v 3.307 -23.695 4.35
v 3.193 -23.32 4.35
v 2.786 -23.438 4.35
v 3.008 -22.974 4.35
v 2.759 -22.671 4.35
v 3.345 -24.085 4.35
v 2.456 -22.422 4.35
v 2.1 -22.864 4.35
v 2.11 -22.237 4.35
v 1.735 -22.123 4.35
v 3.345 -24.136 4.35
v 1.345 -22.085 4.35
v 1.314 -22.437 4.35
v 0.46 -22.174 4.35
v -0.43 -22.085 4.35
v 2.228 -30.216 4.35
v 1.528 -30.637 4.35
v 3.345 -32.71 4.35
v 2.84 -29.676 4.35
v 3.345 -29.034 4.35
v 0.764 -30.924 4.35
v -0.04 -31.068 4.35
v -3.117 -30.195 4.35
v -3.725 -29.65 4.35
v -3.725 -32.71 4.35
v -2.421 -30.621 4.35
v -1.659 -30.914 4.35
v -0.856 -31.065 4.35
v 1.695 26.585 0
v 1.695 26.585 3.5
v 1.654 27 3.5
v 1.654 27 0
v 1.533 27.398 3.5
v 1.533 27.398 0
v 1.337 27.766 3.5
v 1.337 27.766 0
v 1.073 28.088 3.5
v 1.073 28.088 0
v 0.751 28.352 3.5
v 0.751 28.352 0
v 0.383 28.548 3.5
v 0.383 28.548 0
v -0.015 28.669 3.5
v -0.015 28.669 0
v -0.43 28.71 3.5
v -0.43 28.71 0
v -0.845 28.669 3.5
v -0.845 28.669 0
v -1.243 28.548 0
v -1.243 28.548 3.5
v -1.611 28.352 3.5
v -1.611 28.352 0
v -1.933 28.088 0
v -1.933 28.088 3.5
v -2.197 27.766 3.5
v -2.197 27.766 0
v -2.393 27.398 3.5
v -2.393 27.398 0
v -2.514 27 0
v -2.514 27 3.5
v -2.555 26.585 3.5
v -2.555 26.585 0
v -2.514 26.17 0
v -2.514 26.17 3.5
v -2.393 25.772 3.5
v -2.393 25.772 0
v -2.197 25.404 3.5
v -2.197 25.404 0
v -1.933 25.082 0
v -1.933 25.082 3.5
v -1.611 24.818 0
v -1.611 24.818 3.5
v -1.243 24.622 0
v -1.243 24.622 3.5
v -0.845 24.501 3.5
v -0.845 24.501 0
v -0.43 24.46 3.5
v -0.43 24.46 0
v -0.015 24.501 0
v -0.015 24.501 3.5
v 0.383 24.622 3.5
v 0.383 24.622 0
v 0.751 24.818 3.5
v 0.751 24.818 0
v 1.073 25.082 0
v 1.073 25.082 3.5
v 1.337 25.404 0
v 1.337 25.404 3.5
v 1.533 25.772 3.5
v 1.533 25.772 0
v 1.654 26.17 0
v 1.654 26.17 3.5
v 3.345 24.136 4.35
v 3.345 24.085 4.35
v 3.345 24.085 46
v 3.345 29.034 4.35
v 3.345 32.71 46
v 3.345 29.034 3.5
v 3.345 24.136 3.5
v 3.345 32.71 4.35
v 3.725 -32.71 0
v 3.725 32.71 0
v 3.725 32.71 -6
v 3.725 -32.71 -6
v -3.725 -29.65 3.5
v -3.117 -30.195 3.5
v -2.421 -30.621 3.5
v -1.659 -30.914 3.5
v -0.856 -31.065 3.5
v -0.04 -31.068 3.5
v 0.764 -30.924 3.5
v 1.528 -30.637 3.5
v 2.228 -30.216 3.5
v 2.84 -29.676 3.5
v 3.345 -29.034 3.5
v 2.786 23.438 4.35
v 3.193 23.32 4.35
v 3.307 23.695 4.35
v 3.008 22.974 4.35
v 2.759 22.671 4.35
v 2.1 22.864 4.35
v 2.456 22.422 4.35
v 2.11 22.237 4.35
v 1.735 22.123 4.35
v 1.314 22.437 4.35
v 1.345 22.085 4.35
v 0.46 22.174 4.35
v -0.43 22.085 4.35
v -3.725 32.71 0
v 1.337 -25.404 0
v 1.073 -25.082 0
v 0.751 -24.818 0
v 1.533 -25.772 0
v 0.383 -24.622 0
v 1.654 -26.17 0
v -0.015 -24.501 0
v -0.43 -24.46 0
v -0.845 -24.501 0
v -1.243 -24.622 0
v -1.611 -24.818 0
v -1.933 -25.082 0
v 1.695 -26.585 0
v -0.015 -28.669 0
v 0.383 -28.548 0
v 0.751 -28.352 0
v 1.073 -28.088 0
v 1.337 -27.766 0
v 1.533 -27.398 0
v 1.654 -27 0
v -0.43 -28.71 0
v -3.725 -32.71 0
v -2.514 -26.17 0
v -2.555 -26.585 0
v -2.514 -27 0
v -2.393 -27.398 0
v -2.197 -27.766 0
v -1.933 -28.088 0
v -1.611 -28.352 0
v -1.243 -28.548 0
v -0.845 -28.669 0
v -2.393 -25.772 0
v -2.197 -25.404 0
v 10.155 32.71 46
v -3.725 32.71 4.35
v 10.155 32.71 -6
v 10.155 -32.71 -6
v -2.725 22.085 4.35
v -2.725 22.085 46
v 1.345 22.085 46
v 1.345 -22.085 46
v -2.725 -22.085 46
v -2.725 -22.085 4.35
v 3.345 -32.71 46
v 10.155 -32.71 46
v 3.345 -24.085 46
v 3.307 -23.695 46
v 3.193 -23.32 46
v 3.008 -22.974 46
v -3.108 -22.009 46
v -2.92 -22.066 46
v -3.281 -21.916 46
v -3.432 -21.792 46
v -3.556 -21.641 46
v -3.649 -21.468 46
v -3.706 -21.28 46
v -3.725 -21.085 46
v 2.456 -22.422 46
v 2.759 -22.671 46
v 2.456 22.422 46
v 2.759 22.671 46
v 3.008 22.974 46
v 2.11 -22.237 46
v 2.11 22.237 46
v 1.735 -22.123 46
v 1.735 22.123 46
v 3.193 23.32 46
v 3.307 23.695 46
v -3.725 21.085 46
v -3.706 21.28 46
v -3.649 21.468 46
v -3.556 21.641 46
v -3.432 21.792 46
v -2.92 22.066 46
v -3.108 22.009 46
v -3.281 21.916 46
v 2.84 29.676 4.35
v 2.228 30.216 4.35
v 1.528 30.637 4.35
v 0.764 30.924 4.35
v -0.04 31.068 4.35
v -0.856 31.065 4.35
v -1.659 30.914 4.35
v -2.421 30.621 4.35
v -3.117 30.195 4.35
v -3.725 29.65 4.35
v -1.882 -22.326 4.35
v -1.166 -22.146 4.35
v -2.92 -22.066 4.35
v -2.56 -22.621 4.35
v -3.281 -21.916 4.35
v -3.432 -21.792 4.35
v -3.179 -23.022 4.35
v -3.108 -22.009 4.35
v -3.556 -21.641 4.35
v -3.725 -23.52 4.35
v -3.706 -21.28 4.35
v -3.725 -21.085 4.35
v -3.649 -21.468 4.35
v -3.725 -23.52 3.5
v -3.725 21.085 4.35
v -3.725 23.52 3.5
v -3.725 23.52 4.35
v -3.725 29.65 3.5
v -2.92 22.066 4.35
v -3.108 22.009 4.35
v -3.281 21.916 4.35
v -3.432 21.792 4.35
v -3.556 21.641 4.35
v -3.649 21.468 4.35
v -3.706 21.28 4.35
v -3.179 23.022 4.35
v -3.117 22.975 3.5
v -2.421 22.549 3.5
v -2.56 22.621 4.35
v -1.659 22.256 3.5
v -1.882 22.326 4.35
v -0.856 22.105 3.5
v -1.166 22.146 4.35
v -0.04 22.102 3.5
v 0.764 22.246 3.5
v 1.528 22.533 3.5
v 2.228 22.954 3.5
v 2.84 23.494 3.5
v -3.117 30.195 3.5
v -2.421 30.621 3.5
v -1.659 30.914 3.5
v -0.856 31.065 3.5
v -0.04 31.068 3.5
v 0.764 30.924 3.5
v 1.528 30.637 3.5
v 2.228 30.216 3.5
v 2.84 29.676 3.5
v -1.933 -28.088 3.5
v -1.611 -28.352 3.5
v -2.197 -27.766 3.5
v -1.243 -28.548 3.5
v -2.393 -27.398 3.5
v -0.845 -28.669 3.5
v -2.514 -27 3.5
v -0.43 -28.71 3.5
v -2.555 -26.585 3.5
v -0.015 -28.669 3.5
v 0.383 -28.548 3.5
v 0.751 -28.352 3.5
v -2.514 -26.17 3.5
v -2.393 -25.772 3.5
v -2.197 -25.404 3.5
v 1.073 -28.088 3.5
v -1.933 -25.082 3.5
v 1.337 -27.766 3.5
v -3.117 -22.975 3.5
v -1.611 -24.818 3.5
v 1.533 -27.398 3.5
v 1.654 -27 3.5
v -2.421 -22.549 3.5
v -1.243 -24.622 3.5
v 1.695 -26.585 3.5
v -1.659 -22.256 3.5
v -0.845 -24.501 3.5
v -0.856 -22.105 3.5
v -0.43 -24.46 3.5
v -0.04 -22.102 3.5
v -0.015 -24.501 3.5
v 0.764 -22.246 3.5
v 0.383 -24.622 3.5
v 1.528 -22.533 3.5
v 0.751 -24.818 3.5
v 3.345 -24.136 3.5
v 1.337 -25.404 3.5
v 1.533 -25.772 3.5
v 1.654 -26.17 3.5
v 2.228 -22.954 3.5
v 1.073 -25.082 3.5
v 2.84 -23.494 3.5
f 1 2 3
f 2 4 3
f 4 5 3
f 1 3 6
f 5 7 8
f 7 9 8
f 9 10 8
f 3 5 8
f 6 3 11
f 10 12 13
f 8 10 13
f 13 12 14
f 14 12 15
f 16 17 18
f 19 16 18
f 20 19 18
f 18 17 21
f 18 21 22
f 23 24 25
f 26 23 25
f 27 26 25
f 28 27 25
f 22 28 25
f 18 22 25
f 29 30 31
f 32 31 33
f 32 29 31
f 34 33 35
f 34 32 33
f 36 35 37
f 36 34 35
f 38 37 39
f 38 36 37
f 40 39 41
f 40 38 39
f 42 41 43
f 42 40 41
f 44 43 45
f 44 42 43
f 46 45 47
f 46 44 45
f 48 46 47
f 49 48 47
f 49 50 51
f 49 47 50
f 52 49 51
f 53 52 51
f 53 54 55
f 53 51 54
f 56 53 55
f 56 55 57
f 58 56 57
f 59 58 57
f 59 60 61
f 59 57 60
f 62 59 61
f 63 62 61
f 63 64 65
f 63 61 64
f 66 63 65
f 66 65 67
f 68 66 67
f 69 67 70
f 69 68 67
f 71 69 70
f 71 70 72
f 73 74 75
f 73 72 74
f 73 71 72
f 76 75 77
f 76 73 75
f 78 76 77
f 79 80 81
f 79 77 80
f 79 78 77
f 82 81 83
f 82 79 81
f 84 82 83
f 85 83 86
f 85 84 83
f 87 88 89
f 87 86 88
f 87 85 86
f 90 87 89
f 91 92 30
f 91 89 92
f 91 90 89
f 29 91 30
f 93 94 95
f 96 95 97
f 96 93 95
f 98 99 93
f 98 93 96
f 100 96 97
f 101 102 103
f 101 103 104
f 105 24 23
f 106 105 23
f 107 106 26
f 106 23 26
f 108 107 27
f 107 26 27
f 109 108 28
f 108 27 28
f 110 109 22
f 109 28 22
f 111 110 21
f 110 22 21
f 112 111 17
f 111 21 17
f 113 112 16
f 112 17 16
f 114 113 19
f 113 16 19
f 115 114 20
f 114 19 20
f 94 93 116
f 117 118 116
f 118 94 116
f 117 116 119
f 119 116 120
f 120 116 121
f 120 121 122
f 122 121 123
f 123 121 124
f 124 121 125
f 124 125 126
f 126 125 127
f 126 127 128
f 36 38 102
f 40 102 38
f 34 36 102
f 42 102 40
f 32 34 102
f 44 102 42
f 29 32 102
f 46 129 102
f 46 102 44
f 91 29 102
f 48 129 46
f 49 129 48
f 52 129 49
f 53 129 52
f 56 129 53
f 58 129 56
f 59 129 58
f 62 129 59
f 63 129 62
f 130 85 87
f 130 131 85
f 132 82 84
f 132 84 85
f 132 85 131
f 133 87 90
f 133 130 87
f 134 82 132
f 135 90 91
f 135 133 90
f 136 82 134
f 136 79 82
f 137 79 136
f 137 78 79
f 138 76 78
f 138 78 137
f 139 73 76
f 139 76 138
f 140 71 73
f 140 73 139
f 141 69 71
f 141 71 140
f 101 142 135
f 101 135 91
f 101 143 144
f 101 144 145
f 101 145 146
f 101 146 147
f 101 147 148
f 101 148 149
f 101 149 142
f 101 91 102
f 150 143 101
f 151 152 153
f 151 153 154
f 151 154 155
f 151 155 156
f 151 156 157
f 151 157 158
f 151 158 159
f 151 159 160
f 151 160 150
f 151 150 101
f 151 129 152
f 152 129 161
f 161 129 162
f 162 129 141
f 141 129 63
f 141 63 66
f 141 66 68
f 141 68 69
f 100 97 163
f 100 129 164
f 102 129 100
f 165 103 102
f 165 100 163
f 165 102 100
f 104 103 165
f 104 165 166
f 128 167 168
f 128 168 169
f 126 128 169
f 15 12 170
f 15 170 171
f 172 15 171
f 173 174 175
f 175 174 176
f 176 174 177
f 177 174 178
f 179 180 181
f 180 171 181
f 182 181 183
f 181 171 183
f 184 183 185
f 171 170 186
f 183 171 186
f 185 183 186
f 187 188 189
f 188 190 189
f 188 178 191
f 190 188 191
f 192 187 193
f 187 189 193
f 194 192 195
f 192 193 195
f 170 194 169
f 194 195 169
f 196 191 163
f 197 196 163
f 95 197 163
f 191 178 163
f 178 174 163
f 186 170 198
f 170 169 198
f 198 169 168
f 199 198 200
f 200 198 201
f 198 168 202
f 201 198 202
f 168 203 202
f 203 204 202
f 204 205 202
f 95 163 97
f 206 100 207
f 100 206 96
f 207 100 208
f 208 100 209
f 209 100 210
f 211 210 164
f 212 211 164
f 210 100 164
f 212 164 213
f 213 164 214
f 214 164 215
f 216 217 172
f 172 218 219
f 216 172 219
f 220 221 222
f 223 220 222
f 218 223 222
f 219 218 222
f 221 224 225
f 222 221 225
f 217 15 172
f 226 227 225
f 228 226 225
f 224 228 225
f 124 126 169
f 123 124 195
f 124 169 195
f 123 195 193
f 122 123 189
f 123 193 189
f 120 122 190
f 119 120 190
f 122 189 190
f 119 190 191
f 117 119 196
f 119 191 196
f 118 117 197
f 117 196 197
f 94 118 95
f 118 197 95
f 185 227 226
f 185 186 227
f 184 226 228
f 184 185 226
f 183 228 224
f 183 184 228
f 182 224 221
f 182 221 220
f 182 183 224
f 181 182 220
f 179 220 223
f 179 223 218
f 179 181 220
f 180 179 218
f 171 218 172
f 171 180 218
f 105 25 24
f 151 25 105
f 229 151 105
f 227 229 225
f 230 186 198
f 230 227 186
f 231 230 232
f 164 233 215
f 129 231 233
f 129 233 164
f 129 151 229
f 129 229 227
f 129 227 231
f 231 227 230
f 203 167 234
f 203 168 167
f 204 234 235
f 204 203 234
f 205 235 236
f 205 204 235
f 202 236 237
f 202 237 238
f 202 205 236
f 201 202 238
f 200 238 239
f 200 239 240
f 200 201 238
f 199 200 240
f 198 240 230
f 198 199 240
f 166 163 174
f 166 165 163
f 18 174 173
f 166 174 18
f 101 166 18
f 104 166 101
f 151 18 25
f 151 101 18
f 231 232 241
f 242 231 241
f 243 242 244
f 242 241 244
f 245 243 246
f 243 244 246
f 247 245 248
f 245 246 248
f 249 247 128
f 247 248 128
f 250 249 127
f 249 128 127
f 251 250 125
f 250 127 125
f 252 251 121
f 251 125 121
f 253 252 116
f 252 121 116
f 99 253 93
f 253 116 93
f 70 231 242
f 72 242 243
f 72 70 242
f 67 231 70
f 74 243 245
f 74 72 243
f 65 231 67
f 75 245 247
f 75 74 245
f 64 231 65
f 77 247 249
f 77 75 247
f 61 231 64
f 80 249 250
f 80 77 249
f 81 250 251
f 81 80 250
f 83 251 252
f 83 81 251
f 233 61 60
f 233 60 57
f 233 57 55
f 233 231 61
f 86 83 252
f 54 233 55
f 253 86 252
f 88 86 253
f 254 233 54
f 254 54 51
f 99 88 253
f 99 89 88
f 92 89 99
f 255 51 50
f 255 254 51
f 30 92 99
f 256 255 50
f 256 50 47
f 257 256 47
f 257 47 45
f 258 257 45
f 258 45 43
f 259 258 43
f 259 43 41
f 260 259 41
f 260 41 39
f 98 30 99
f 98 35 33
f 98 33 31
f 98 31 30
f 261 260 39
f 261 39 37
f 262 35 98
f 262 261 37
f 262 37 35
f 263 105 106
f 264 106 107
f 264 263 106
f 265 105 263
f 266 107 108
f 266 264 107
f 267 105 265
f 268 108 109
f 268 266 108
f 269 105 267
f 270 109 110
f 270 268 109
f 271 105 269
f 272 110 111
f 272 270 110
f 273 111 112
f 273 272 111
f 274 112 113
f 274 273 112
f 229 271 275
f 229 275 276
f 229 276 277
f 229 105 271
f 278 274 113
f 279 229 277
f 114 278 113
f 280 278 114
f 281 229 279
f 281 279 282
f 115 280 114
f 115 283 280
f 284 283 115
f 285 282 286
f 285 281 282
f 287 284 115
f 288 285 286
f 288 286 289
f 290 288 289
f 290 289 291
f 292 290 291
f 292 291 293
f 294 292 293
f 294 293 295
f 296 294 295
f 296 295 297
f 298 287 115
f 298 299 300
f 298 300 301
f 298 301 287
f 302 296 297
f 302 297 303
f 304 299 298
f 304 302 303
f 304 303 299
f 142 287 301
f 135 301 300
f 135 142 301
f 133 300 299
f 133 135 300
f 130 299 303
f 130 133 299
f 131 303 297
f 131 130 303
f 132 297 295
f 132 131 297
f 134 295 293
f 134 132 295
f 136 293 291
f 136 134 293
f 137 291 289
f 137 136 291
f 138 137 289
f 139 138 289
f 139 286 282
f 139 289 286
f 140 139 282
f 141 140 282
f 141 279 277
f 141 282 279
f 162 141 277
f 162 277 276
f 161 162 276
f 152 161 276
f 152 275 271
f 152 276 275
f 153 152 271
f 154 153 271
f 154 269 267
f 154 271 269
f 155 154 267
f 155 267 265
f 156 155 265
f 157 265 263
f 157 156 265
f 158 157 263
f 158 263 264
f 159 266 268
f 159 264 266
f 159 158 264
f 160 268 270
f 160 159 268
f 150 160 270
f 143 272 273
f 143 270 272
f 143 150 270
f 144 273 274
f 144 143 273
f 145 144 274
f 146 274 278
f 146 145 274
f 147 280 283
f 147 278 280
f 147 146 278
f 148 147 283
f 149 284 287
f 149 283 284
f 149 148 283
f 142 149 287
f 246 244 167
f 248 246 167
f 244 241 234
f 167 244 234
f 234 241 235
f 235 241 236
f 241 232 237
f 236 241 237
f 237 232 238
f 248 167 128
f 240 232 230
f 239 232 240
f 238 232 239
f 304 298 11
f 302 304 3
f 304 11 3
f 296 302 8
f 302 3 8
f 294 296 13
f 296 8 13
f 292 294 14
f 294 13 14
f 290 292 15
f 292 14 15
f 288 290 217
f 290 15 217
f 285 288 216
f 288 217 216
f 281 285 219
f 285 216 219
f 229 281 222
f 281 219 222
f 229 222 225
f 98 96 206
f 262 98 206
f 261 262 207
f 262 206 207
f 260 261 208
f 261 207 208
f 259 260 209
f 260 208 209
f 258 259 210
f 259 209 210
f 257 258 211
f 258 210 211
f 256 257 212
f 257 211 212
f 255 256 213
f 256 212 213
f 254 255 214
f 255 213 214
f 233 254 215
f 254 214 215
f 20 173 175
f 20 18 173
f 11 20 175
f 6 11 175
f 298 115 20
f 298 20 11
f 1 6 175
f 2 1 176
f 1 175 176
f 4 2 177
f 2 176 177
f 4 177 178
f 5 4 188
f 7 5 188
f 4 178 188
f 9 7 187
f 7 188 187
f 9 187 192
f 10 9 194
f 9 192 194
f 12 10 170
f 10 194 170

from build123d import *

# Parameters (mm, degrees)
SKETCH_W        = 7.45
SKETCH_H        = 65.42
SKETCH_R        = 2.125
PAD_DEPTH       = 4.35
POCKET_DEPTH    = 0.85
POCKET_FACE1_W  = 65.42
POCKET_FACE1_H  = 4.35
PAD001_DEPTH    = 6.43
PAD001_FACE13_W = 65.42
PAD001_FACE13_H = 6.43
PAD002_DEPTH    = 6
PAD003_DEPTH    = 41.65
FILLET_R        = 2
FILLET001_R     = 1


with BuildPart() as part:
    # Sketch → Pad (new body)
    with BuildSketch(Plane.XY):
        Rectangle(SKETCH_W, SKETCH_H)
        with Locations((-0.43, -26.585)):
            Circle(SKETCH_R, mode=Mode.SUBTRACT)
        with Locations((-0.43, 26.585)):
            Circle(SKETCH_R, mode=Mode.SUBTRACT)
    extrude(amount=PAD_DEPTH)

    # Sketch001 (on DatumPlane) → Pocket (cut)
    with BuildSketch(Plane.XY.offset(4.35)):
        with BuildLine():
            ThreePointArc((3.345, -24.135638), (-0.039757, -22.101953), (-3.725, -23.520204))
            Line((-3.725, -23.520204), (-3.725, -29.649796))
            ThreePointArc((-3.725, -29.649796), (-0.039757, -31.068047), (3.345, -29.034362))
            Line((3.345, -24.135638), (3.345, -29.034362))
        make_face()
        with BuildLine():
            ThreePointArc((-3.725, 23.520204), (-0.039757, 22.101953), (3.345, 24.135638))
            Line((3.345, 29.034362), (3.345, 24.135638))
            ThreePointArc((3.345, 29.034362), (-0.039757, 31.068047), (-3.725, 29.649796))
            Line((-3.725, 29.649796), (-3.725, 23.520204))
        make_face()
    extrude(amount=-POCKET_DEPTH, mode=Mode.SUBTRACT)

    # Pocket Face1 → Pad001 (add)
    with BuildSketch(Plane(origin=(3.725, 0, 2.175), x_dir=(0, -1, 0), z_dir=(1, 0, 0))):
        Rectangle(POCKET_FACE1_W, POCKET_FACE1_H)
    extrude(amount=PAD001_DEPTH)

    # Pad001 Face13 → Pad002 (add)
    with BuildSketch(Plane(origin=(6.94, 0, 0), x_dir=(0, -1, 0), z_dir=(0, 0, -1))):
        Rectangle(PAD001_FACE13_W, PAD001_FACE13_H)
    extrude(amount=PAD002_DEPTH)

    # Sketch002 (on Face5 of Pad002) → Pad003 (join)
    with BuildSketch(Plane.XY.offset(4.35)):
        Polygon((10.155, 32.71), (10.155, -32.71), (3.345, -32.71), (3.345, -22.085), (-3.725, -22.085), (-3.725, 22.085), (3.345, 22.085), (3.345, 32.71), align=None)
    extrude(amount=PAD003_DEPTH)

    # Fillet
    fillet_edges = [part.edges().sort_by_distance(p)[0] for p in [
        (3.345, -22.085, 25.175),
        (3.345, 22.085, 25.175),
    ]]
    fillet(fillet_edges, radius=FILLET_R)

    # Fillet001
    fillet001_edges = [part.edges().sort_by_distance(p)[0] for p in [
        (-3.725, -22.085, 25.175),
        (-3.725, 22.085, 25.175),
    ]]
    fillet(fillet001_edges, radius=FILLET001_R)


solid = part.part
